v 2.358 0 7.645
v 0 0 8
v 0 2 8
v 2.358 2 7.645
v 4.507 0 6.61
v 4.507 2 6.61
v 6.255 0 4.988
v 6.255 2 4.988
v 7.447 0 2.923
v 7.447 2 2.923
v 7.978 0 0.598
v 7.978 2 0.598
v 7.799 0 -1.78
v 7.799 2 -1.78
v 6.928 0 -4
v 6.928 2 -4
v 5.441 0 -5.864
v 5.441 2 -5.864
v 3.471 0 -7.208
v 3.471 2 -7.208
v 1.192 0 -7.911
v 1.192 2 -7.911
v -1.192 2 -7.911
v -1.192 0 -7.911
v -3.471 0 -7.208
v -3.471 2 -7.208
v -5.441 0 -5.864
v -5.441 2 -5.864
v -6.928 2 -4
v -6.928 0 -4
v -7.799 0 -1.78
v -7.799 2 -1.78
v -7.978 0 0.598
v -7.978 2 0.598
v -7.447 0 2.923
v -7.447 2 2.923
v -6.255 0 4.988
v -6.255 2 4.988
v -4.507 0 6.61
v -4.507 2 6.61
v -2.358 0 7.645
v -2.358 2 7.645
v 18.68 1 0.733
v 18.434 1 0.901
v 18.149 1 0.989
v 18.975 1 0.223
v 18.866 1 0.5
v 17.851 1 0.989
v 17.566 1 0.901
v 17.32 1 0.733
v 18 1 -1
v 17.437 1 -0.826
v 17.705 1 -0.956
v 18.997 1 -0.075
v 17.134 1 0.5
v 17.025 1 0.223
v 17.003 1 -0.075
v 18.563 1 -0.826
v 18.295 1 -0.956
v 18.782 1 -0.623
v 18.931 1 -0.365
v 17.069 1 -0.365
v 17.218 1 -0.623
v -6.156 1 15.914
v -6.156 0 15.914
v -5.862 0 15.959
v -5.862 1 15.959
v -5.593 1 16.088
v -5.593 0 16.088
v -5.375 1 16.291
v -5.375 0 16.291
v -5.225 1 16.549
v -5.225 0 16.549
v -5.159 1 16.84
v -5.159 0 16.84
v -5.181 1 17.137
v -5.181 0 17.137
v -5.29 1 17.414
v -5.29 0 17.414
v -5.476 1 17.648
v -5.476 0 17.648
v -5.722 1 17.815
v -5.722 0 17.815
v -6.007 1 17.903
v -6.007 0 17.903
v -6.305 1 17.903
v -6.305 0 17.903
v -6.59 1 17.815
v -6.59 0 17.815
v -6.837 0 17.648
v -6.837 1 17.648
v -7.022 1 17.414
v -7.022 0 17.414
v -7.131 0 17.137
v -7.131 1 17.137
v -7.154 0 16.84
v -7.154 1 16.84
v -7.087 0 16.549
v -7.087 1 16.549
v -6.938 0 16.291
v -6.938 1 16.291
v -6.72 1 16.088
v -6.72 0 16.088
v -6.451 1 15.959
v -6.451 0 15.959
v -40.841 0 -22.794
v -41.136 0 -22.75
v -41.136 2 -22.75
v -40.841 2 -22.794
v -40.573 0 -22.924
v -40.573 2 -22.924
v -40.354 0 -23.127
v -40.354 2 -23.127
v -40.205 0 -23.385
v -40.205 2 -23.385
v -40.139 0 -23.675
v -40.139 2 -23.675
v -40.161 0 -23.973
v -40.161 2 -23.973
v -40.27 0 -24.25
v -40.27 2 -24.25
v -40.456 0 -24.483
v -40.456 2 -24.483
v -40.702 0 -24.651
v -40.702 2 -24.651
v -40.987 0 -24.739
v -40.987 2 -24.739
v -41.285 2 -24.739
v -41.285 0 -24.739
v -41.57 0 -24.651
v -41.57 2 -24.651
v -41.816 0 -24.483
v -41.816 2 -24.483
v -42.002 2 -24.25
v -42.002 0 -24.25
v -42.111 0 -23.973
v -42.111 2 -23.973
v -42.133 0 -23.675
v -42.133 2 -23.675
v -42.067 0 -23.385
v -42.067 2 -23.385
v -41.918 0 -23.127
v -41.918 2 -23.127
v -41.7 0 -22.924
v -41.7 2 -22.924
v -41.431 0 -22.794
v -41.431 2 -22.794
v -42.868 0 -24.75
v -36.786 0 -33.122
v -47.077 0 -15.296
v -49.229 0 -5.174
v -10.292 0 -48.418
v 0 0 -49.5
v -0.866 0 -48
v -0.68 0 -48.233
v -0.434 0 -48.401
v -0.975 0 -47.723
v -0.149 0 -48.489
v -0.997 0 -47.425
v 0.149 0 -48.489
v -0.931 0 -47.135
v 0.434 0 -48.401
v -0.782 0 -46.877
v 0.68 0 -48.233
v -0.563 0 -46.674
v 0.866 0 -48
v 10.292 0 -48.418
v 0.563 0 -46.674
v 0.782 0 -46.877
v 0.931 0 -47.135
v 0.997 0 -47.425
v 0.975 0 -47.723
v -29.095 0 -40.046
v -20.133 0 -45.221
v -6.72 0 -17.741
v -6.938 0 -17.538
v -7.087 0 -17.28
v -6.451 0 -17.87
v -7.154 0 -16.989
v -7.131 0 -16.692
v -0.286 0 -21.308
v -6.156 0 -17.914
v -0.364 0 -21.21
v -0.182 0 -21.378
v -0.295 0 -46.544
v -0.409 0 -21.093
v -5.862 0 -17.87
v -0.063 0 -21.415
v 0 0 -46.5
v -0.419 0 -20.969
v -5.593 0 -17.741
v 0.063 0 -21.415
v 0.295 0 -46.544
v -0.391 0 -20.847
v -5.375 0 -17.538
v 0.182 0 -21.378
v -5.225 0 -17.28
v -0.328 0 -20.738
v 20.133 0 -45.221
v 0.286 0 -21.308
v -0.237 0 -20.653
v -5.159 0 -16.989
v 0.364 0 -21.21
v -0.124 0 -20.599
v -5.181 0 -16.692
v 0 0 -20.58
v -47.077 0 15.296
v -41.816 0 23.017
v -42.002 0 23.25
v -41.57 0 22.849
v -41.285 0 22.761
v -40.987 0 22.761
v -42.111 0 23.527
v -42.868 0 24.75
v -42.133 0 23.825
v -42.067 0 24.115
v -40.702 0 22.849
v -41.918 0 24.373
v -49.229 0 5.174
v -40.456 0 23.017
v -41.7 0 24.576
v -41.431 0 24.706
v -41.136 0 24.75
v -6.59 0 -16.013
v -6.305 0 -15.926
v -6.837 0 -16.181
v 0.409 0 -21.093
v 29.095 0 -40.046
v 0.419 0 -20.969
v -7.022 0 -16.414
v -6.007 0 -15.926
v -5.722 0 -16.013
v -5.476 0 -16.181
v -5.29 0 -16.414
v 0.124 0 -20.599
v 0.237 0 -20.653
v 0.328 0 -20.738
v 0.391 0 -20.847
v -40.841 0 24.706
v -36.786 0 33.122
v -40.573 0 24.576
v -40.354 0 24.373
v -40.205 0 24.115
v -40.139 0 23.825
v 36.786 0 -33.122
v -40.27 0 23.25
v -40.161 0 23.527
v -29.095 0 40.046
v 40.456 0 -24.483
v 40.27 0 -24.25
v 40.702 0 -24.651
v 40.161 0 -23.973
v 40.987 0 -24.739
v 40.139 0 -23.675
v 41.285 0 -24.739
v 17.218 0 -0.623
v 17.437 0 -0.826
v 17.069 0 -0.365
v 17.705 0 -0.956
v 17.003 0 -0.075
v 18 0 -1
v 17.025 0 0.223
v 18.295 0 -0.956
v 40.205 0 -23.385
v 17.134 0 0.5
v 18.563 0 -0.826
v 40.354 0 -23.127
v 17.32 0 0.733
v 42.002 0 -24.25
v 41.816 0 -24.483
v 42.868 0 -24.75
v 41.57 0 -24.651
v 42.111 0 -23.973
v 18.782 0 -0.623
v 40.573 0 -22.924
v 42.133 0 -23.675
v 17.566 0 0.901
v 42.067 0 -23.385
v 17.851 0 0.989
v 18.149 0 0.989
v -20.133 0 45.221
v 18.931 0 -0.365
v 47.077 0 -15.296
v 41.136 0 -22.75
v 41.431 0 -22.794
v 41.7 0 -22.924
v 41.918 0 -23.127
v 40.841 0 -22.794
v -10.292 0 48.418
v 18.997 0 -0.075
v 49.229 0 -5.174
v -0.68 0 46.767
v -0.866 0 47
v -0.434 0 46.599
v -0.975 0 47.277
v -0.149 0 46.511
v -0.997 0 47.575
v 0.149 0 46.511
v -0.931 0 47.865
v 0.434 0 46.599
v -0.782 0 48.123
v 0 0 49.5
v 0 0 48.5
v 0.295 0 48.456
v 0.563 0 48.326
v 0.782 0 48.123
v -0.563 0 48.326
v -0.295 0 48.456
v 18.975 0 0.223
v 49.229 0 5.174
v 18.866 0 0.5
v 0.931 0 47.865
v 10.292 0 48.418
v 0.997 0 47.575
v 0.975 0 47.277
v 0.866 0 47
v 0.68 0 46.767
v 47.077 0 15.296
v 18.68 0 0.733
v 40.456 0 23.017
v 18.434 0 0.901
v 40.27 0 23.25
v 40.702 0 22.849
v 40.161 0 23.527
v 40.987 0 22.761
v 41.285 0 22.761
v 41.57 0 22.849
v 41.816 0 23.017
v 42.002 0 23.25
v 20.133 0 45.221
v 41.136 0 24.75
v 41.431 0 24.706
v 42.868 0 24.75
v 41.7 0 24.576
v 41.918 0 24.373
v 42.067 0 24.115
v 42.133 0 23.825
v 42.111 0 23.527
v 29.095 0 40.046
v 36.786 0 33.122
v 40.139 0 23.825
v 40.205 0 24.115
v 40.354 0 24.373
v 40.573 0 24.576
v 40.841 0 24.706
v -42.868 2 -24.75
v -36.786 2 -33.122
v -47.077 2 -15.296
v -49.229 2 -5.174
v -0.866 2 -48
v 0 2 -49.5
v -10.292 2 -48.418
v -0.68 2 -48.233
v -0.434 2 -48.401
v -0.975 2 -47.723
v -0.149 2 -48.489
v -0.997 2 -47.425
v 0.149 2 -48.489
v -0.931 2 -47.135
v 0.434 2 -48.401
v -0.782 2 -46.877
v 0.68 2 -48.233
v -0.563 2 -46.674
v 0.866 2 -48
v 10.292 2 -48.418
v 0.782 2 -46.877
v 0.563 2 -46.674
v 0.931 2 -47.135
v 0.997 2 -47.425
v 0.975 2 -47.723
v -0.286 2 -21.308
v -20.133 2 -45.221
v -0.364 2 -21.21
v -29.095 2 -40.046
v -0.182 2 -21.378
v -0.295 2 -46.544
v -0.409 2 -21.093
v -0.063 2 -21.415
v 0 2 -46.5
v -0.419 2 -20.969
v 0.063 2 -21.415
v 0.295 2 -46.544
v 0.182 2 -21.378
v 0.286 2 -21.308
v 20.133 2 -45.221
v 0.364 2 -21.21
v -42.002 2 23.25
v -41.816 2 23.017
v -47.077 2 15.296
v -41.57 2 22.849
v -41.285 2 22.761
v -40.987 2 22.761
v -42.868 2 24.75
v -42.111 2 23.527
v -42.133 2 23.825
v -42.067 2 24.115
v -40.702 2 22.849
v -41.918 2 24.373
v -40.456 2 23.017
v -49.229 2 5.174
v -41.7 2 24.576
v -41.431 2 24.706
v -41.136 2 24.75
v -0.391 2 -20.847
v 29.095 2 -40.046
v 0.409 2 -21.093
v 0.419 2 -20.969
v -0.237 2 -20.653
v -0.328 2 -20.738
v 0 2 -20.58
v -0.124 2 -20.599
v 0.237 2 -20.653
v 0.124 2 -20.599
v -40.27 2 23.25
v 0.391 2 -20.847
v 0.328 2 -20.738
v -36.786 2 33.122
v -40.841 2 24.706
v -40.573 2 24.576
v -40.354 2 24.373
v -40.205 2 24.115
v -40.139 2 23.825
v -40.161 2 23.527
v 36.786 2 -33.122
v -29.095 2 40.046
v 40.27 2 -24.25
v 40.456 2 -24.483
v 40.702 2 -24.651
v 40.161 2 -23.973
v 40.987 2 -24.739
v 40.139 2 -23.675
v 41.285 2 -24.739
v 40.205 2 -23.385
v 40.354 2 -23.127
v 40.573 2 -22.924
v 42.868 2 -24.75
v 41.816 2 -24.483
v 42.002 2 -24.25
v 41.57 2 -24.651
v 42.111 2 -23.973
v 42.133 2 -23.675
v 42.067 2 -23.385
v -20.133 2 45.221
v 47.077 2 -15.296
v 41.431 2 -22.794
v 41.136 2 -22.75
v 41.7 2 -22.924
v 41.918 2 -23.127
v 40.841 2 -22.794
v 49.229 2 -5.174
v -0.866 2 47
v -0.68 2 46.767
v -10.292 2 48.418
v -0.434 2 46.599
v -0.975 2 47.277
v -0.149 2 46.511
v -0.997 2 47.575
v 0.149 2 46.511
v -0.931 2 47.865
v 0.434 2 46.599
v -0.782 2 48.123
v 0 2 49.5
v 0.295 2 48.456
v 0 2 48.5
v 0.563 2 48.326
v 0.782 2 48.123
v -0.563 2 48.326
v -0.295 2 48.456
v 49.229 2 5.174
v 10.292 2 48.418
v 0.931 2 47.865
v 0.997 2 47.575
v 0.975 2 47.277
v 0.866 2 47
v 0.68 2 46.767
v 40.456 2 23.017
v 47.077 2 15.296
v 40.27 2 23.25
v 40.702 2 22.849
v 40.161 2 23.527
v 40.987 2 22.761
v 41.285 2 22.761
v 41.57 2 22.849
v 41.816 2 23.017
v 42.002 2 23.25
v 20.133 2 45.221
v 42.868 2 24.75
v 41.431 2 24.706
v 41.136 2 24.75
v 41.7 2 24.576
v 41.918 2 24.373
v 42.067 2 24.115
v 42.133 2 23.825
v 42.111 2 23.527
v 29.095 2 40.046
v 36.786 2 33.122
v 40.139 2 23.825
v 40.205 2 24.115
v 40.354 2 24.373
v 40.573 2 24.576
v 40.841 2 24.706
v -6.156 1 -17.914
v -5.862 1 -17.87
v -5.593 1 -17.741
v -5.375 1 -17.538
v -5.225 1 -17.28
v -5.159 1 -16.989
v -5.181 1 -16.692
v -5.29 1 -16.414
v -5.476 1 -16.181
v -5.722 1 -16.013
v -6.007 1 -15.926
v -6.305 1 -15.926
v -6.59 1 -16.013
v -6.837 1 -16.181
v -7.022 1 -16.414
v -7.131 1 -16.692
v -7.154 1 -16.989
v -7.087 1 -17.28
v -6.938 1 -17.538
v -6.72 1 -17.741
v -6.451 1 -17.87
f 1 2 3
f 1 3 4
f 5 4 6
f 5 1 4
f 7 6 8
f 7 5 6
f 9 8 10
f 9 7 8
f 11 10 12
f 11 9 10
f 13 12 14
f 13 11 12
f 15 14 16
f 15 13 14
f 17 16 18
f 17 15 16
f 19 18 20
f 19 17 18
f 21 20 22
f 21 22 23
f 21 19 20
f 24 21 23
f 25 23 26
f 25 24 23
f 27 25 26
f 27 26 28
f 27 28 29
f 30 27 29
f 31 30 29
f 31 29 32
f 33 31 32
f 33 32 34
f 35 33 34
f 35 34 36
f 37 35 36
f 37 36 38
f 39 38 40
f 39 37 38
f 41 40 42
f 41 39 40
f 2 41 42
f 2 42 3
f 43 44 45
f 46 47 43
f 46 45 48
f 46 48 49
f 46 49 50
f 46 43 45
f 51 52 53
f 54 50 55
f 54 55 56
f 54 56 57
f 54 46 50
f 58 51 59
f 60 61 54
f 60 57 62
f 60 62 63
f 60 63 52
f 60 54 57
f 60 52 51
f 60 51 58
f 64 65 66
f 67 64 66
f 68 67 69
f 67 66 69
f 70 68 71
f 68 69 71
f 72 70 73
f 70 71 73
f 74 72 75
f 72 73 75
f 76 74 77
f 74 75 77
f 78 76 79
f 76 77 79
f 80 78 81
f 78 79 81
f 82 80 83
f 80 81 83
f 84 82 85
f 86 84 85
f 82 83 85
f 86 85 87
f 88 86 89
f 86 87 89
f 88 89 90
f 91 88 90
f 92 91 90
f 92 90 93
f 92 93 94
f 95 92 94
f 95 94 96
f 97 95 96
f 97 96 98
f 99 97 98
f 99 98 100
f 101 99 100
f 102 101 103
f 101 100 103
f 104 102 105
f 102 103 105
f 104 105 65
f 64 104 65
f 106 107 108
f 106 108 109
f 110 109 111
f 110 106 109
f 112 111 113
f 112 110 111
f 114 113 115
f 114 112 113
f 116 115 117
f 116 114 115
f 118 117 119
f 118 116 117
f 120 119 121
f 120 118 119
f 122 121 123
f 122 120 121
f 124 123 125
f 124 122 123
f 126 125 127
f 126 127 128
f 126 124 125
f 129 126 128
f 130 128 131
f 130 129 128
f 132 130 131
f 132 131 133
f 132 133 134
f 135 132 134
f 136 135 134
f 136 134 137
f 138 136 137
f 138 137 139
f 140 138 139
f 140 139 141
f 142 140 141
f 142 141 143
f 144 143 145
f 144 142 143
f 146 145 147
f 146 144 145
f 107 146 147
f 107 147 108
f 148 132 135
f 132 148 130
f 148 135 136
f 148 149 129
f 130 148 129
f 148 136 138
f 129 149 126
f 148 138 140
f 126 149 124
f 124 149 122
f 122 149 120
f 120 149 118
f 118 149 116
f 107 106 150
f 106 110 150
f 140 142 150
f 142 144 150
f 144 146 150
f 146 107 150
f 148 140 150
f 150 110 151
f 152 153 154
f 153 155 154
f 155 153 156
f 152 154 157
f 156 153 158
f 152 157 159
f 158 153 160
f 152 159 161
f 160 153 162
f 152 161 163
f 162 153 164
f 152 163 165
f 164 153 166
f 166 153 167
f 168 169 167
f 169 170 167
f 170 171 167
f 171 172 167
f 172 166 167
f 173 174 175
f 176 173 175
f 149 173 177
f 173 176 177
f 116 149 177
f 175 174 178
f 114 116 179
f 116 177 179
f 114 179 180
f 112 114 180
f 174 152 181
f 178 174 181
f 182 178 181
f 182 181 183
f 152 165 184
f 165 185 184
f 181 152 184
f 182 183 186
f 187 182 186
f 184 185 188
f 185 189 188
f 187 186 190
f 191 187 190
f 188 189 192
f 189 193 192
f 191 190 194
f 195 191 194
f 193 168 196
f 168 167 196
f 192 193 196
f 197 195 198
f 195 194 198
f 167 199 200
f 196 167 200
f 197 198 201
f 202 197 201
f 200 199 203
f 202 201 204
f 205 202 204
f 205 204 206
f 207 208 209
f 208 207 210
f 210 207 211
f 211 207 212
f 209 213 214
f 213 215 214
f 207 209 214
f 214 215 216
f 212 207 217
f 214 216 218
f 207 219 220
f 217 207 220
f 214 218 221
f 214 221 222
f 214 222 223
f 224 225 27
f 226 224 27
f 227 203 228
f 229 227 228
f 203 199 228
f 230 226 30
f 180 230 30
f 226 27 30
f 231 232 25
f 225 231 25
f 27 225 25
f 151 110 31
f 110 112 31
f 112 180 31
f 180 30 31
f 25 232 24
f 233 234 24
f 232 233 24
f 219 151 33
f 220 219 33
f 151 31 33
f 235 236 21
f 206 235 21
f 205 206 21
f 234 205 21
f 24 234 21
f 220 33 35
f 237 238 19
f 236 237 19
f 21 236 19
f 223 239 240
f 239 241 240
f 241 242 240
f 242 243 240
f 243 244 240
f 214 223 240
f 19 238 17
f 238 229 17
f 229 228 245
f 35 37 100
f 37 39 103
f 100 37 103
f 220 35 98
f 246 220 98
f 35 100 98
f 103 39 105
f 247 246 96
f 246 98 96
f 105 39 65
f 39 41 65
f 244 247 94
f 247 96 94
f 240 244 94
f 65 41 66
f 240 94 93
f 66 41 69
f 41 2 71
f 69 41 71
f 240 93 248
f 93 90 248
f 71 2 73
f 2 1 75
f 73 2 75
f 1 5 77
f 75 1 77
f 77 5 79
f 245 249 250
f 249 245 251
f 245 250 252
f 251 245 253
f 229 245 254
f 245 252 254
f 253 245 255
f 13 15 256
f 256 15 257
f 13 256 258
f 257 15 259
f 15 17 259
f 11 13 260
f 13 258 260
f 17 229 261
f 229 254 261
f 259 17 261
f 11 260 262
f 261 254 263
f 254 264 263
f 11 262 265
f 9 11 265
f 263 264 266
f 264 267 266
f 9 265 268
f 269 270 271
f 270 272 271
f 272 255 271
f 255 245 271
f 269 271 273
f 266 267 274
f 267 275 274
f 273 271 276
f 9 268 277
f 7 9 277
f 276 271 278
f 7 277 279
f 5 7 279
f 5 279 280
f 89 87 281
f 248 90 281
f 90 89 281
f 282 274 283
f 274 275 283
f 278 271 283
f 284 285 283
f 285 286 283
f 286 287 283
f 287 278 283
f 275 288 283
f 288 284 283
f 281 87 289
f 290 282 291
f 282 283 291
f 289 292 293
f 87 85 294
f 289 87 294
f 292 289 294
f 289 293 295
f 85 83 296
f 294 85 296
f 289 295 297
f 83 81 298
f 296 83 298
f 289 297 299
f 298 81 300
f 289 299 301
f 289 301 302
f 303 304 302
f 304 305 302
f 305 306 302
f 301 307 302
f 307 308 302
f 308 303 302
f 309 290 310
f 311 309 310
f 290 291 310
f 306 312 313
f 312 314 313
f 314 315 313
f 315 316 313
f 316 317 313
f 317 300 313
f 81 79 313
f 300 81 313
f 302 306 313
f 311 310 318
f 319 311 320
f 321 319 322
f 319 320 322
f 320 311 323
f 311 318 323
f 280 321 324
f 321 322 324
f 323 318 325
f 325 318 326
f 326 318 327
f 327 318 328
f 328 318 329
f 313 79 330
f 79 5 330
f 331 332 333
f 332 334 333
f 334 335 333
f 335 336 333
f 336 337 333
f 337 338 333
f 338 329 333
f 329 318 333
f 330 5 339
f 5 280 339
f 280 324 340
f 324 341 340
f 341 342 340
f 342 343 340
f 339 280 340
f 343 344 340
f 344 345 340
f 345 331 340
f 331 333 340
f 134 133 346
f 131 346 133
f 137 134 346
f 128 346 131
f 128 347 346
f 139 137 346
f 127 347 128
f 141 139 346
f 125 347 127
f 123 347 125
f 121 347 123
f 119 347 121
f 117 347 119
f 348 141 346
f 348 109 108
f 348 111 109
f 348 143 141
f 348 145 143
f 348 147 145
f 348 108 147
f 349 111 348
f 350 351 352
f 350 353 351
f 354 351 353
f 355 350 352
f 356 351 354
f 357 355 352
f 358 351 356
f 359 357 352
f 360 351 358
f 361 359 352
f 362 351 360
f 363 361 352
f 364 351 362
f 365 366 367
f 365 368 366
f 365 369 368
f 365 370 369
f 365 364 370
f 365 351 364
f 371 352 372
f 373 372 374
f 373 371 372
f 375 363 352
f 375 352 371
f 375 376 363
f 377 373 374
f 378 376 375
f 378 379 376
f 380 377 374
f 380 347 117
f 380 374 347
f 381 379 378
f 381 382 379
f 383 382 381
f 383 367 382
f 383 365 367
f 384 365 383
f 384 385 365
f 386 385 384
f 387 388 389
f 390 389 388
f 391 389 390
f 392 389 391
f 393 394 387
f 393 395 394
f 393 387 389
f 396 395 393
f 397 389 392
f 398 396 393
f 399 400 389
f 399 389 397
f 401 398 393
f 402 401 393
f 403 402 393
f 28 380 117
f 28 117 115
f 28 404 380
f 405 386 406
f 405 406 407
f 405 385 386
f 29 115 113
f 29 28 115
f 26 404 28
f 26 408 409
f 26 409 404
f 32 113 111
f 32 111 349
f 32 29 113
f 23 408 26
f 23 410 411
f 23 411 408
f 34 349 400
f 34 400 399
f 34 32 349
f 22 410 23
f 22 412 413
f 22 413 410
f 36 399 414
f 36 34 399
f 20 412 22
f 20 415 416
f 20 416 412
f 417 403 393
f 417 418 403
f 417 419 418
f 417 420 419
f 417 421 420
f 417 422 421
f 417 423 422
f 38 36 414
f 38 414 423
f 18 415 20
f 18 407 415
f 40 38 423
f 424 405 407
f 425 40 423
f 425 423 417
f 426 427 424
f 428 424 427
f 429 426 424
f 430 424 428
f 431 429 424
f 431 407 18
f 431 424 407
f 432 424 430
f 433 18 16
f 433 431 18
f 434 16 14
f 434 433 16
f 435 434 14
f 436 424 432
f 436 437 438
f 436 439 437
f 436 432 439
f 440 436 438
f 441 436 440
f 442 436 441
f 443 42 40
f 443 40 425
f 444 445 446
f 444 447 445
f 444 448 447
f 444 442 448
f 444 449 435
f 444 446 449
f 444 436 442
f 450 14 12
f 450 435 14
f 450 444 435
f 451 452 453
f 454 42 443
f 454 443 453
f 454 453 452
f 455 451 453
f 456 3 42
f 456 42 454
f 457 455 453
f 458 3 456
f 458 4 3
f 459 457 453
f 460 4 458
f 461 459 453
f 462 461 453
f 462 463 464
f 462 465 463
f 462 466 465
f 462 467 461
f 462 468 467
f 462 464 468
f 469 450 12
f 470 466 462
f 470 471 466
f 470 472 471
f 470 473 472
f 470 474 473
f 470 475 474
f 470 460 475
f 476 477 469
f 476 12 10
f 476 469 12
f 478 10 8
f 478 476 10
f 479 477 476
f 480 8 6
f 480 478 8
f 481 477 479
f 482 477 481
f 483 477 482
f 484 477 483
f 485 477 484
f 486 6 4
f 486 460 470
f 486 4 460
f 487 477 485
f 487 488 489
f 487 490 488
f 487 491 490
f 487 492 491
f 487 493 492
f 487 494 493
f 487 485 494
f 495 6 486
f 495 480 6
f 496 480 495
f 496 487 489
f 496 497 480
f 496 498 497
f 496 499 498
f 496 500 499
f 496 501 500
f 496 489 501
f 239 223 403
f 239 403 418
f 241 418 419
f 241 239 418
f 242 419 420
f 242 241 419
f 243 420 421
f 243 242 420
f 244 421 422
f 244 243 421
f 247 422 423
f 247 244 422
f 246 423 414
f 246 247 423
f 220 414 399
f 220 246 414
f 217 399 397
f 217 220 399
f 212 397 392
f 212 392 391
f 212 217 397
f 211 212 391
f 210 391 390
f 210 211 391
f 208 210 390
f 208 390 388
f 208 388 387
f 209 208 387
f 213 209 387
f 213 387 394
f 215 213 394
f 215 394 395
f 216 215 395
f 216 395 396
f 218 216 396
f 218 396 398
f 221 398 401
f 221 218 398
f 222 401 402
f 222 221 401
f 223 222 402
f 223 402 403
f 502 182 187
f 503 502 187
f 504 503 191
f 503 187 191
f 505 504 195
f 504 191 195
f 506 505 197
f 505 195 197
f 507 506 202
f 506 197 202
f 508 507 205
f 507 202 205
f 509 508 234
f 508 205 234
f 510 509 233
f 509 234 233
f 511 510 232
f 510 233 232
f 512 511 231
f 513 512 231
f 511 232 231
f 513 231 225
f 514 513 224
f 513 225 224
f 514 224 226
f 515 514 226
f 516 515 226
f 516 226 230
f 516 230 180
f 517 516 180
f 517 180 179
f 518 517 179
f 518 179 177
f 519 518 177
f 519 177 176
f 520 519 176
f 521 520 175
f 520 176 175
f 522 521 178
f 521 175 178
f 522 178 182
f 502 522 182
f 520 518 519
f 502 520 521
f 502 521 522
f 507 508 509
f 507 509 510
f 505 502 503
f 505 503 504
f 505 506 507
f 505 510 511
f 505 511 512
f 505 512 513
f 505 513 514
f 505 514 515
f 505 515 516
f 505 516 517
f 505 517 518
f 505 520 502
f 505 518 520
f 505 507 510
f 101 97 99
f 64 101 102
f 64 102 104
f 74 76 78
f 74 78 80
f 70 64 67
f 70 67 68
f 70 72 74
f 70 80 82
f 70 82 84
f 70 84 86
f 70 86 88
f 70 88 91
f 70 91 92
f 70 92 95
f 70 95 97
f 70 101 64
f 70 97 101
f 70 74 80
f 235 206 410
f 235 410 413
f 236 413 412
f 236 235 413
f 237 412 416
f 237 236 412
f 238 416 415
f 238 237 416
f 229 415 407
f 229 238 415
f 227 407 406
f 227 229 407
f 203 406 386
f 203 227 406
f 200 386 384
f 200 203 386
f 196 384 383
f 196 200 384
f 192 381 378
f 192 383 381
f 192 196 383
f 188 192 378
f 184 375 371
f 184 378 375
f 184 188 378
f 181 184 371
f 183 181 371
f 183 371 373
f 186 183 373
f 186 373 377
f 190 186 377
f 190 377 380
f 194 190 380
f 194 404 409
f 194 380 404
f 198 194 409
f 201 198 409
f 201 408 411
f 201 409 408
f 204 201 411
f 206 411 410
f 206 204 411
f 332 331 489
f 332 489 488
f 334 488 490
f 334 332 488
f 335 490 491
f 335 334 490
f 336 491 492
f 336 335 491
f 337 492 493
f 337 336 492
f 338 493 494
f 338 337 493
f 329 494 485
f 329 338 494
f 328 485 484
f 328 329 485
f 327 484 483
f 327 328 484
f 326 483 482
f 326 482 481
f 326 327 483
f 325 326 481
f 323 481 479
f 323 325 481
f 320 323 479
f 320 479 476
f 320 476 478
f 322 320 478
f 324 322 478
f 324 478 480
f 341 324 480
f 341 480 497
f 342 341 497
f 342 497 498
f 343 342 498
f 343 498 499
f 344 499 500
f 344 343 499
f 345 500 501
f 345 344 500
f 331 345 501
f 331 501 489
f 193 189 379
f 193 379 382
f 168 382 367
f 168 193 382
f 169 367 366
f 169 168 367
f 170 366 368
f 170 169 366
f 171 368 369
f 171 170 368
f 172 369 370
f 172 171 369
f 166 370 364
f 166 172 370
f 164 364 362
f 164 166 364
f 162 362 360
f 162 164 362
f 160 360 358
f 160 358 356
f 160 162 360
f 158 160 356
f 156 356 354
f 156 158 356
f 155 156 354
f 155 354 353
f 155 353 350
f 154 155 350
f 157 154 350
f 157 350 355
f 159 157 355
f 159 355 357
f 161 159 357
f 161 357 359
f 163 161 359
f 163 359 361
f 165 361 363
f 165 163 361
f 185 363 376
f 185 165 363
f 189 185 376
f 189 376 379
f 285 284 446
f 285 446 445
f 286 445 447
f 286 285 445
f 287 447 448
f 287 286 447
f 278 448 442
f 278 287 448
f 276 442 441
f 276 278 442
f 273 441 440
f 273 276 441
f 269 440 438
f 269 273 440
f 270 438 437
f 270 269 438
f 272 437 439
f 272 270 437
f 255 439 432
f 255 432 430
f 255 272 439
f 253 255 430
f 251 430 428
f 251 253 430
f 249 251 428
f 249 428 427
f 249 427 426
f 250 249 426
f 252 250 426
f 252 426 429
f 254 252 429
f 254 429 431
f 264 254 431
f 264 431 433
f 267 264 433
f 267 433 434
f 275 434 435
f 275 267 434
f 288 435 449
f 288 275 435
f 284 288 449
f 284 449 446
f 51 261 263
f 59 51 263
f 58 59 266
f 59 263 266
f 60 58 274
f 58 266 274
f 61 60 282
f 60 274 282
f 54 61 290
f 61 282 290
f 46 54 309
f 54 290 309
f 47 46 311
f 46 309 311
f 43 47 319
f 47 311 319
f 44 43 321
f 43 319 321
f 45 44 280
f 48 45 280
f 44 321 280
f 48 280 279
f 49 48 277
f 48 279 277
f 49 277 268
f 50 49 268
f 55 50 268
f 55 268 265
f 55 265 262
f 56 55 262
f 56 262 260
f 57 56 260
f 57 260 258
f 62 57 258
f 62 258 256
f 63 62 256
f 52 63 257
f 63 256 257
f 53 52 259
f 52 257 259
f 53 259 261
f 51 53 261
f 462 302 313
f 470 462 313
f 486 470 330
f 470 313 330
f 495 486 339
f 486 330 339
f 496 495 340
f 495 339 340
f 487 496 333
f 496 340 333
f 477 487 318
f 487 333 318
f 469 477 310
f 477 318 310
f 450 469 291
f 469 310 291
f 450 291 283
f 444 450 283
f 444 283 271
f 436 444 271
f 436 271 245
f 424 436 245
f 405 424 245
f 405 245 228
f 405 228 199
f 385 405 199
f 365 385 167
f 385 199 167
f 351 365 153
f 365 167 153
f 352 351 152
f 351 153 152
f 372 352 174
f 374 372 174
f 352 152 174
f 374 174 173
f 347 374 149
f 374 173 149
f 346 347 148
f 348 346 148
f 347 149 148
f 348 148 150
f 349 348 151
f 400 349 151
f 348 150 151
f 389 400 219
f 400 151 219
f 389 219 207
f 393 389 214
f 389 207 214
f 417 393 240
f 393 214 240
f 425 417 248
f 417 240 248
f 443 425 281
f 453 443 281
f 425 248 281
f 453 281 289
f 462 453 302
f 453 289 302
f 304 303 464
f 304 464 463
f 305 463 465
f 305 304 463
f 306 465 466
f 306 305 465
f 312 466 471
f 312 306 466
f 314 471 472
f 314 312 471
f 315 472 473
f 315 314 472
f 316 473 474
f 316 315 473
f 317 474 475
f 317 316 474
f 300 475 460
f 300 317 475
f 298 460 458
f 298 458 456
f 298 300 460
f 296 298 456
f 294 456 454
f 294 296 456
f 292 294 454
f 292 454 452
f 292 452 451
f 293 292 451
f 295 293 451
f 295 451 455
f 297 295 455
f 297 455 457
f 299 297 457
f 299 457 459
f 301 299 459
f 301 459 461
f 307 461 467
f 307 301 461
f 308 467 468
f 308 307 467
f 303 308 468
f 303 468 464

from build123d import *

# Parameters (mm, degrees)
SKETCH1_R               = 49.5
SKETCH1_R_2             = 8
SKETCH1_R_3             = 1
BOSS_EXTRUDE1_DEPTH     = 2
CUT_EXTRUDE1_DEPTH      = 71.032135481
CUT_EXTRUDE1_DEPTH_BACK = 71.032135481
SKETCH2_R               = 0.42
SKETCH3_R               = 1
CUT_EXTRUDE2_DEPTH      = 1


with BuildPart() as part:
    # Sketch1 → Boss-Extrude1 (new body)
    with BuildSketch(Plane(origin=(0, 0, 0), x_dir=(1, 0, 0), z_dir=(0, 1, 0))):
        with Locations(Location((0, 0, 0), (0, 0, 270))):
            Circle(SKETCH1_R)
        with Locations(Location((0, 0, 0), (0, 0, 270))):
            Circle(SKETCH1_R_2, mode=Mode.SUBTRACT)
        with Locations(Location((0, 47.5, 0), (0, 0, 270))):
            Circle(SKETCH1_R_3, mode=Mode.SUBTRACT)
        with Locations(Location((41.13620668, 23.75, 0), (0, 0, 270))):
            Circle(SKETCH1_R_3, mode=Mode.SUBTRACT)
        with Locations(Location((41.13620668, -23.75, 0), (0, 0, 270))):
            Circle(SKETCH1_R_3, mode=Mode.SUBTRACT)
        with Locations(Location((0, -47.5, 0), (0, 0, 270))):
            Circle(SKETCH1_R_3, mode=Mode.SUBTRACT)
        with Locations(Location((-41.13620668, -23.75, 0), (0, 0, 270))):
            Circle(SKETCH1_R_3, mode=Mode.SUBTRACT)
        with Locations(Location((-41.13620668, 23.75, 0), (0, 0, 270))):
            Circle(SKETCH1_R_3, mode=Mode.SUBTRACT)
    extrude(amount=BOSS_EXTRUDE1_DEPTH)

    # Sketch2 → Cut-Extrude1 (cut, two sides: drawn at the far end of the back side and taken through both)
    with BuildSketch(Plane(origin=(0, 2, 0), x_dir=(1, 0, 0), z_dir=(0, 1, 0)).offset(-CUT_EXTRUDE1_DEPTH_BACK)):
        with Locations(Location((0, 21, 0), (0, 0, 270))):
            Circle(SKETCH2_R)
    extrude(amount=CUT_EXTRUDE1_DEPTH + CUT_EXTRUDE1_DEPTH_BACK, mode=Mode.SUBTRACT)

    # Sketch3 → Cut-Extrude2 (cut)
    with BuildSketch(Plane.XZ):
        with Locations(Location((-6.15636258, 16.914467174, 0), (0, 0, 270))):
            Circle(SKETCH3_R)
        with Locations(Location((-6.15636258, -16.914467174, 0), (0, 0, 270))):
            Circle(SKETCH3_R)
        with Locations(Location((18, 0, 0), (0, 0, 270))):
            Circle(SKETCH3_R)
    extrude(amount=-CUT_EXTRUDE2_DEPTH, mode=Mode.SUBTRACT)


solid = part.part
